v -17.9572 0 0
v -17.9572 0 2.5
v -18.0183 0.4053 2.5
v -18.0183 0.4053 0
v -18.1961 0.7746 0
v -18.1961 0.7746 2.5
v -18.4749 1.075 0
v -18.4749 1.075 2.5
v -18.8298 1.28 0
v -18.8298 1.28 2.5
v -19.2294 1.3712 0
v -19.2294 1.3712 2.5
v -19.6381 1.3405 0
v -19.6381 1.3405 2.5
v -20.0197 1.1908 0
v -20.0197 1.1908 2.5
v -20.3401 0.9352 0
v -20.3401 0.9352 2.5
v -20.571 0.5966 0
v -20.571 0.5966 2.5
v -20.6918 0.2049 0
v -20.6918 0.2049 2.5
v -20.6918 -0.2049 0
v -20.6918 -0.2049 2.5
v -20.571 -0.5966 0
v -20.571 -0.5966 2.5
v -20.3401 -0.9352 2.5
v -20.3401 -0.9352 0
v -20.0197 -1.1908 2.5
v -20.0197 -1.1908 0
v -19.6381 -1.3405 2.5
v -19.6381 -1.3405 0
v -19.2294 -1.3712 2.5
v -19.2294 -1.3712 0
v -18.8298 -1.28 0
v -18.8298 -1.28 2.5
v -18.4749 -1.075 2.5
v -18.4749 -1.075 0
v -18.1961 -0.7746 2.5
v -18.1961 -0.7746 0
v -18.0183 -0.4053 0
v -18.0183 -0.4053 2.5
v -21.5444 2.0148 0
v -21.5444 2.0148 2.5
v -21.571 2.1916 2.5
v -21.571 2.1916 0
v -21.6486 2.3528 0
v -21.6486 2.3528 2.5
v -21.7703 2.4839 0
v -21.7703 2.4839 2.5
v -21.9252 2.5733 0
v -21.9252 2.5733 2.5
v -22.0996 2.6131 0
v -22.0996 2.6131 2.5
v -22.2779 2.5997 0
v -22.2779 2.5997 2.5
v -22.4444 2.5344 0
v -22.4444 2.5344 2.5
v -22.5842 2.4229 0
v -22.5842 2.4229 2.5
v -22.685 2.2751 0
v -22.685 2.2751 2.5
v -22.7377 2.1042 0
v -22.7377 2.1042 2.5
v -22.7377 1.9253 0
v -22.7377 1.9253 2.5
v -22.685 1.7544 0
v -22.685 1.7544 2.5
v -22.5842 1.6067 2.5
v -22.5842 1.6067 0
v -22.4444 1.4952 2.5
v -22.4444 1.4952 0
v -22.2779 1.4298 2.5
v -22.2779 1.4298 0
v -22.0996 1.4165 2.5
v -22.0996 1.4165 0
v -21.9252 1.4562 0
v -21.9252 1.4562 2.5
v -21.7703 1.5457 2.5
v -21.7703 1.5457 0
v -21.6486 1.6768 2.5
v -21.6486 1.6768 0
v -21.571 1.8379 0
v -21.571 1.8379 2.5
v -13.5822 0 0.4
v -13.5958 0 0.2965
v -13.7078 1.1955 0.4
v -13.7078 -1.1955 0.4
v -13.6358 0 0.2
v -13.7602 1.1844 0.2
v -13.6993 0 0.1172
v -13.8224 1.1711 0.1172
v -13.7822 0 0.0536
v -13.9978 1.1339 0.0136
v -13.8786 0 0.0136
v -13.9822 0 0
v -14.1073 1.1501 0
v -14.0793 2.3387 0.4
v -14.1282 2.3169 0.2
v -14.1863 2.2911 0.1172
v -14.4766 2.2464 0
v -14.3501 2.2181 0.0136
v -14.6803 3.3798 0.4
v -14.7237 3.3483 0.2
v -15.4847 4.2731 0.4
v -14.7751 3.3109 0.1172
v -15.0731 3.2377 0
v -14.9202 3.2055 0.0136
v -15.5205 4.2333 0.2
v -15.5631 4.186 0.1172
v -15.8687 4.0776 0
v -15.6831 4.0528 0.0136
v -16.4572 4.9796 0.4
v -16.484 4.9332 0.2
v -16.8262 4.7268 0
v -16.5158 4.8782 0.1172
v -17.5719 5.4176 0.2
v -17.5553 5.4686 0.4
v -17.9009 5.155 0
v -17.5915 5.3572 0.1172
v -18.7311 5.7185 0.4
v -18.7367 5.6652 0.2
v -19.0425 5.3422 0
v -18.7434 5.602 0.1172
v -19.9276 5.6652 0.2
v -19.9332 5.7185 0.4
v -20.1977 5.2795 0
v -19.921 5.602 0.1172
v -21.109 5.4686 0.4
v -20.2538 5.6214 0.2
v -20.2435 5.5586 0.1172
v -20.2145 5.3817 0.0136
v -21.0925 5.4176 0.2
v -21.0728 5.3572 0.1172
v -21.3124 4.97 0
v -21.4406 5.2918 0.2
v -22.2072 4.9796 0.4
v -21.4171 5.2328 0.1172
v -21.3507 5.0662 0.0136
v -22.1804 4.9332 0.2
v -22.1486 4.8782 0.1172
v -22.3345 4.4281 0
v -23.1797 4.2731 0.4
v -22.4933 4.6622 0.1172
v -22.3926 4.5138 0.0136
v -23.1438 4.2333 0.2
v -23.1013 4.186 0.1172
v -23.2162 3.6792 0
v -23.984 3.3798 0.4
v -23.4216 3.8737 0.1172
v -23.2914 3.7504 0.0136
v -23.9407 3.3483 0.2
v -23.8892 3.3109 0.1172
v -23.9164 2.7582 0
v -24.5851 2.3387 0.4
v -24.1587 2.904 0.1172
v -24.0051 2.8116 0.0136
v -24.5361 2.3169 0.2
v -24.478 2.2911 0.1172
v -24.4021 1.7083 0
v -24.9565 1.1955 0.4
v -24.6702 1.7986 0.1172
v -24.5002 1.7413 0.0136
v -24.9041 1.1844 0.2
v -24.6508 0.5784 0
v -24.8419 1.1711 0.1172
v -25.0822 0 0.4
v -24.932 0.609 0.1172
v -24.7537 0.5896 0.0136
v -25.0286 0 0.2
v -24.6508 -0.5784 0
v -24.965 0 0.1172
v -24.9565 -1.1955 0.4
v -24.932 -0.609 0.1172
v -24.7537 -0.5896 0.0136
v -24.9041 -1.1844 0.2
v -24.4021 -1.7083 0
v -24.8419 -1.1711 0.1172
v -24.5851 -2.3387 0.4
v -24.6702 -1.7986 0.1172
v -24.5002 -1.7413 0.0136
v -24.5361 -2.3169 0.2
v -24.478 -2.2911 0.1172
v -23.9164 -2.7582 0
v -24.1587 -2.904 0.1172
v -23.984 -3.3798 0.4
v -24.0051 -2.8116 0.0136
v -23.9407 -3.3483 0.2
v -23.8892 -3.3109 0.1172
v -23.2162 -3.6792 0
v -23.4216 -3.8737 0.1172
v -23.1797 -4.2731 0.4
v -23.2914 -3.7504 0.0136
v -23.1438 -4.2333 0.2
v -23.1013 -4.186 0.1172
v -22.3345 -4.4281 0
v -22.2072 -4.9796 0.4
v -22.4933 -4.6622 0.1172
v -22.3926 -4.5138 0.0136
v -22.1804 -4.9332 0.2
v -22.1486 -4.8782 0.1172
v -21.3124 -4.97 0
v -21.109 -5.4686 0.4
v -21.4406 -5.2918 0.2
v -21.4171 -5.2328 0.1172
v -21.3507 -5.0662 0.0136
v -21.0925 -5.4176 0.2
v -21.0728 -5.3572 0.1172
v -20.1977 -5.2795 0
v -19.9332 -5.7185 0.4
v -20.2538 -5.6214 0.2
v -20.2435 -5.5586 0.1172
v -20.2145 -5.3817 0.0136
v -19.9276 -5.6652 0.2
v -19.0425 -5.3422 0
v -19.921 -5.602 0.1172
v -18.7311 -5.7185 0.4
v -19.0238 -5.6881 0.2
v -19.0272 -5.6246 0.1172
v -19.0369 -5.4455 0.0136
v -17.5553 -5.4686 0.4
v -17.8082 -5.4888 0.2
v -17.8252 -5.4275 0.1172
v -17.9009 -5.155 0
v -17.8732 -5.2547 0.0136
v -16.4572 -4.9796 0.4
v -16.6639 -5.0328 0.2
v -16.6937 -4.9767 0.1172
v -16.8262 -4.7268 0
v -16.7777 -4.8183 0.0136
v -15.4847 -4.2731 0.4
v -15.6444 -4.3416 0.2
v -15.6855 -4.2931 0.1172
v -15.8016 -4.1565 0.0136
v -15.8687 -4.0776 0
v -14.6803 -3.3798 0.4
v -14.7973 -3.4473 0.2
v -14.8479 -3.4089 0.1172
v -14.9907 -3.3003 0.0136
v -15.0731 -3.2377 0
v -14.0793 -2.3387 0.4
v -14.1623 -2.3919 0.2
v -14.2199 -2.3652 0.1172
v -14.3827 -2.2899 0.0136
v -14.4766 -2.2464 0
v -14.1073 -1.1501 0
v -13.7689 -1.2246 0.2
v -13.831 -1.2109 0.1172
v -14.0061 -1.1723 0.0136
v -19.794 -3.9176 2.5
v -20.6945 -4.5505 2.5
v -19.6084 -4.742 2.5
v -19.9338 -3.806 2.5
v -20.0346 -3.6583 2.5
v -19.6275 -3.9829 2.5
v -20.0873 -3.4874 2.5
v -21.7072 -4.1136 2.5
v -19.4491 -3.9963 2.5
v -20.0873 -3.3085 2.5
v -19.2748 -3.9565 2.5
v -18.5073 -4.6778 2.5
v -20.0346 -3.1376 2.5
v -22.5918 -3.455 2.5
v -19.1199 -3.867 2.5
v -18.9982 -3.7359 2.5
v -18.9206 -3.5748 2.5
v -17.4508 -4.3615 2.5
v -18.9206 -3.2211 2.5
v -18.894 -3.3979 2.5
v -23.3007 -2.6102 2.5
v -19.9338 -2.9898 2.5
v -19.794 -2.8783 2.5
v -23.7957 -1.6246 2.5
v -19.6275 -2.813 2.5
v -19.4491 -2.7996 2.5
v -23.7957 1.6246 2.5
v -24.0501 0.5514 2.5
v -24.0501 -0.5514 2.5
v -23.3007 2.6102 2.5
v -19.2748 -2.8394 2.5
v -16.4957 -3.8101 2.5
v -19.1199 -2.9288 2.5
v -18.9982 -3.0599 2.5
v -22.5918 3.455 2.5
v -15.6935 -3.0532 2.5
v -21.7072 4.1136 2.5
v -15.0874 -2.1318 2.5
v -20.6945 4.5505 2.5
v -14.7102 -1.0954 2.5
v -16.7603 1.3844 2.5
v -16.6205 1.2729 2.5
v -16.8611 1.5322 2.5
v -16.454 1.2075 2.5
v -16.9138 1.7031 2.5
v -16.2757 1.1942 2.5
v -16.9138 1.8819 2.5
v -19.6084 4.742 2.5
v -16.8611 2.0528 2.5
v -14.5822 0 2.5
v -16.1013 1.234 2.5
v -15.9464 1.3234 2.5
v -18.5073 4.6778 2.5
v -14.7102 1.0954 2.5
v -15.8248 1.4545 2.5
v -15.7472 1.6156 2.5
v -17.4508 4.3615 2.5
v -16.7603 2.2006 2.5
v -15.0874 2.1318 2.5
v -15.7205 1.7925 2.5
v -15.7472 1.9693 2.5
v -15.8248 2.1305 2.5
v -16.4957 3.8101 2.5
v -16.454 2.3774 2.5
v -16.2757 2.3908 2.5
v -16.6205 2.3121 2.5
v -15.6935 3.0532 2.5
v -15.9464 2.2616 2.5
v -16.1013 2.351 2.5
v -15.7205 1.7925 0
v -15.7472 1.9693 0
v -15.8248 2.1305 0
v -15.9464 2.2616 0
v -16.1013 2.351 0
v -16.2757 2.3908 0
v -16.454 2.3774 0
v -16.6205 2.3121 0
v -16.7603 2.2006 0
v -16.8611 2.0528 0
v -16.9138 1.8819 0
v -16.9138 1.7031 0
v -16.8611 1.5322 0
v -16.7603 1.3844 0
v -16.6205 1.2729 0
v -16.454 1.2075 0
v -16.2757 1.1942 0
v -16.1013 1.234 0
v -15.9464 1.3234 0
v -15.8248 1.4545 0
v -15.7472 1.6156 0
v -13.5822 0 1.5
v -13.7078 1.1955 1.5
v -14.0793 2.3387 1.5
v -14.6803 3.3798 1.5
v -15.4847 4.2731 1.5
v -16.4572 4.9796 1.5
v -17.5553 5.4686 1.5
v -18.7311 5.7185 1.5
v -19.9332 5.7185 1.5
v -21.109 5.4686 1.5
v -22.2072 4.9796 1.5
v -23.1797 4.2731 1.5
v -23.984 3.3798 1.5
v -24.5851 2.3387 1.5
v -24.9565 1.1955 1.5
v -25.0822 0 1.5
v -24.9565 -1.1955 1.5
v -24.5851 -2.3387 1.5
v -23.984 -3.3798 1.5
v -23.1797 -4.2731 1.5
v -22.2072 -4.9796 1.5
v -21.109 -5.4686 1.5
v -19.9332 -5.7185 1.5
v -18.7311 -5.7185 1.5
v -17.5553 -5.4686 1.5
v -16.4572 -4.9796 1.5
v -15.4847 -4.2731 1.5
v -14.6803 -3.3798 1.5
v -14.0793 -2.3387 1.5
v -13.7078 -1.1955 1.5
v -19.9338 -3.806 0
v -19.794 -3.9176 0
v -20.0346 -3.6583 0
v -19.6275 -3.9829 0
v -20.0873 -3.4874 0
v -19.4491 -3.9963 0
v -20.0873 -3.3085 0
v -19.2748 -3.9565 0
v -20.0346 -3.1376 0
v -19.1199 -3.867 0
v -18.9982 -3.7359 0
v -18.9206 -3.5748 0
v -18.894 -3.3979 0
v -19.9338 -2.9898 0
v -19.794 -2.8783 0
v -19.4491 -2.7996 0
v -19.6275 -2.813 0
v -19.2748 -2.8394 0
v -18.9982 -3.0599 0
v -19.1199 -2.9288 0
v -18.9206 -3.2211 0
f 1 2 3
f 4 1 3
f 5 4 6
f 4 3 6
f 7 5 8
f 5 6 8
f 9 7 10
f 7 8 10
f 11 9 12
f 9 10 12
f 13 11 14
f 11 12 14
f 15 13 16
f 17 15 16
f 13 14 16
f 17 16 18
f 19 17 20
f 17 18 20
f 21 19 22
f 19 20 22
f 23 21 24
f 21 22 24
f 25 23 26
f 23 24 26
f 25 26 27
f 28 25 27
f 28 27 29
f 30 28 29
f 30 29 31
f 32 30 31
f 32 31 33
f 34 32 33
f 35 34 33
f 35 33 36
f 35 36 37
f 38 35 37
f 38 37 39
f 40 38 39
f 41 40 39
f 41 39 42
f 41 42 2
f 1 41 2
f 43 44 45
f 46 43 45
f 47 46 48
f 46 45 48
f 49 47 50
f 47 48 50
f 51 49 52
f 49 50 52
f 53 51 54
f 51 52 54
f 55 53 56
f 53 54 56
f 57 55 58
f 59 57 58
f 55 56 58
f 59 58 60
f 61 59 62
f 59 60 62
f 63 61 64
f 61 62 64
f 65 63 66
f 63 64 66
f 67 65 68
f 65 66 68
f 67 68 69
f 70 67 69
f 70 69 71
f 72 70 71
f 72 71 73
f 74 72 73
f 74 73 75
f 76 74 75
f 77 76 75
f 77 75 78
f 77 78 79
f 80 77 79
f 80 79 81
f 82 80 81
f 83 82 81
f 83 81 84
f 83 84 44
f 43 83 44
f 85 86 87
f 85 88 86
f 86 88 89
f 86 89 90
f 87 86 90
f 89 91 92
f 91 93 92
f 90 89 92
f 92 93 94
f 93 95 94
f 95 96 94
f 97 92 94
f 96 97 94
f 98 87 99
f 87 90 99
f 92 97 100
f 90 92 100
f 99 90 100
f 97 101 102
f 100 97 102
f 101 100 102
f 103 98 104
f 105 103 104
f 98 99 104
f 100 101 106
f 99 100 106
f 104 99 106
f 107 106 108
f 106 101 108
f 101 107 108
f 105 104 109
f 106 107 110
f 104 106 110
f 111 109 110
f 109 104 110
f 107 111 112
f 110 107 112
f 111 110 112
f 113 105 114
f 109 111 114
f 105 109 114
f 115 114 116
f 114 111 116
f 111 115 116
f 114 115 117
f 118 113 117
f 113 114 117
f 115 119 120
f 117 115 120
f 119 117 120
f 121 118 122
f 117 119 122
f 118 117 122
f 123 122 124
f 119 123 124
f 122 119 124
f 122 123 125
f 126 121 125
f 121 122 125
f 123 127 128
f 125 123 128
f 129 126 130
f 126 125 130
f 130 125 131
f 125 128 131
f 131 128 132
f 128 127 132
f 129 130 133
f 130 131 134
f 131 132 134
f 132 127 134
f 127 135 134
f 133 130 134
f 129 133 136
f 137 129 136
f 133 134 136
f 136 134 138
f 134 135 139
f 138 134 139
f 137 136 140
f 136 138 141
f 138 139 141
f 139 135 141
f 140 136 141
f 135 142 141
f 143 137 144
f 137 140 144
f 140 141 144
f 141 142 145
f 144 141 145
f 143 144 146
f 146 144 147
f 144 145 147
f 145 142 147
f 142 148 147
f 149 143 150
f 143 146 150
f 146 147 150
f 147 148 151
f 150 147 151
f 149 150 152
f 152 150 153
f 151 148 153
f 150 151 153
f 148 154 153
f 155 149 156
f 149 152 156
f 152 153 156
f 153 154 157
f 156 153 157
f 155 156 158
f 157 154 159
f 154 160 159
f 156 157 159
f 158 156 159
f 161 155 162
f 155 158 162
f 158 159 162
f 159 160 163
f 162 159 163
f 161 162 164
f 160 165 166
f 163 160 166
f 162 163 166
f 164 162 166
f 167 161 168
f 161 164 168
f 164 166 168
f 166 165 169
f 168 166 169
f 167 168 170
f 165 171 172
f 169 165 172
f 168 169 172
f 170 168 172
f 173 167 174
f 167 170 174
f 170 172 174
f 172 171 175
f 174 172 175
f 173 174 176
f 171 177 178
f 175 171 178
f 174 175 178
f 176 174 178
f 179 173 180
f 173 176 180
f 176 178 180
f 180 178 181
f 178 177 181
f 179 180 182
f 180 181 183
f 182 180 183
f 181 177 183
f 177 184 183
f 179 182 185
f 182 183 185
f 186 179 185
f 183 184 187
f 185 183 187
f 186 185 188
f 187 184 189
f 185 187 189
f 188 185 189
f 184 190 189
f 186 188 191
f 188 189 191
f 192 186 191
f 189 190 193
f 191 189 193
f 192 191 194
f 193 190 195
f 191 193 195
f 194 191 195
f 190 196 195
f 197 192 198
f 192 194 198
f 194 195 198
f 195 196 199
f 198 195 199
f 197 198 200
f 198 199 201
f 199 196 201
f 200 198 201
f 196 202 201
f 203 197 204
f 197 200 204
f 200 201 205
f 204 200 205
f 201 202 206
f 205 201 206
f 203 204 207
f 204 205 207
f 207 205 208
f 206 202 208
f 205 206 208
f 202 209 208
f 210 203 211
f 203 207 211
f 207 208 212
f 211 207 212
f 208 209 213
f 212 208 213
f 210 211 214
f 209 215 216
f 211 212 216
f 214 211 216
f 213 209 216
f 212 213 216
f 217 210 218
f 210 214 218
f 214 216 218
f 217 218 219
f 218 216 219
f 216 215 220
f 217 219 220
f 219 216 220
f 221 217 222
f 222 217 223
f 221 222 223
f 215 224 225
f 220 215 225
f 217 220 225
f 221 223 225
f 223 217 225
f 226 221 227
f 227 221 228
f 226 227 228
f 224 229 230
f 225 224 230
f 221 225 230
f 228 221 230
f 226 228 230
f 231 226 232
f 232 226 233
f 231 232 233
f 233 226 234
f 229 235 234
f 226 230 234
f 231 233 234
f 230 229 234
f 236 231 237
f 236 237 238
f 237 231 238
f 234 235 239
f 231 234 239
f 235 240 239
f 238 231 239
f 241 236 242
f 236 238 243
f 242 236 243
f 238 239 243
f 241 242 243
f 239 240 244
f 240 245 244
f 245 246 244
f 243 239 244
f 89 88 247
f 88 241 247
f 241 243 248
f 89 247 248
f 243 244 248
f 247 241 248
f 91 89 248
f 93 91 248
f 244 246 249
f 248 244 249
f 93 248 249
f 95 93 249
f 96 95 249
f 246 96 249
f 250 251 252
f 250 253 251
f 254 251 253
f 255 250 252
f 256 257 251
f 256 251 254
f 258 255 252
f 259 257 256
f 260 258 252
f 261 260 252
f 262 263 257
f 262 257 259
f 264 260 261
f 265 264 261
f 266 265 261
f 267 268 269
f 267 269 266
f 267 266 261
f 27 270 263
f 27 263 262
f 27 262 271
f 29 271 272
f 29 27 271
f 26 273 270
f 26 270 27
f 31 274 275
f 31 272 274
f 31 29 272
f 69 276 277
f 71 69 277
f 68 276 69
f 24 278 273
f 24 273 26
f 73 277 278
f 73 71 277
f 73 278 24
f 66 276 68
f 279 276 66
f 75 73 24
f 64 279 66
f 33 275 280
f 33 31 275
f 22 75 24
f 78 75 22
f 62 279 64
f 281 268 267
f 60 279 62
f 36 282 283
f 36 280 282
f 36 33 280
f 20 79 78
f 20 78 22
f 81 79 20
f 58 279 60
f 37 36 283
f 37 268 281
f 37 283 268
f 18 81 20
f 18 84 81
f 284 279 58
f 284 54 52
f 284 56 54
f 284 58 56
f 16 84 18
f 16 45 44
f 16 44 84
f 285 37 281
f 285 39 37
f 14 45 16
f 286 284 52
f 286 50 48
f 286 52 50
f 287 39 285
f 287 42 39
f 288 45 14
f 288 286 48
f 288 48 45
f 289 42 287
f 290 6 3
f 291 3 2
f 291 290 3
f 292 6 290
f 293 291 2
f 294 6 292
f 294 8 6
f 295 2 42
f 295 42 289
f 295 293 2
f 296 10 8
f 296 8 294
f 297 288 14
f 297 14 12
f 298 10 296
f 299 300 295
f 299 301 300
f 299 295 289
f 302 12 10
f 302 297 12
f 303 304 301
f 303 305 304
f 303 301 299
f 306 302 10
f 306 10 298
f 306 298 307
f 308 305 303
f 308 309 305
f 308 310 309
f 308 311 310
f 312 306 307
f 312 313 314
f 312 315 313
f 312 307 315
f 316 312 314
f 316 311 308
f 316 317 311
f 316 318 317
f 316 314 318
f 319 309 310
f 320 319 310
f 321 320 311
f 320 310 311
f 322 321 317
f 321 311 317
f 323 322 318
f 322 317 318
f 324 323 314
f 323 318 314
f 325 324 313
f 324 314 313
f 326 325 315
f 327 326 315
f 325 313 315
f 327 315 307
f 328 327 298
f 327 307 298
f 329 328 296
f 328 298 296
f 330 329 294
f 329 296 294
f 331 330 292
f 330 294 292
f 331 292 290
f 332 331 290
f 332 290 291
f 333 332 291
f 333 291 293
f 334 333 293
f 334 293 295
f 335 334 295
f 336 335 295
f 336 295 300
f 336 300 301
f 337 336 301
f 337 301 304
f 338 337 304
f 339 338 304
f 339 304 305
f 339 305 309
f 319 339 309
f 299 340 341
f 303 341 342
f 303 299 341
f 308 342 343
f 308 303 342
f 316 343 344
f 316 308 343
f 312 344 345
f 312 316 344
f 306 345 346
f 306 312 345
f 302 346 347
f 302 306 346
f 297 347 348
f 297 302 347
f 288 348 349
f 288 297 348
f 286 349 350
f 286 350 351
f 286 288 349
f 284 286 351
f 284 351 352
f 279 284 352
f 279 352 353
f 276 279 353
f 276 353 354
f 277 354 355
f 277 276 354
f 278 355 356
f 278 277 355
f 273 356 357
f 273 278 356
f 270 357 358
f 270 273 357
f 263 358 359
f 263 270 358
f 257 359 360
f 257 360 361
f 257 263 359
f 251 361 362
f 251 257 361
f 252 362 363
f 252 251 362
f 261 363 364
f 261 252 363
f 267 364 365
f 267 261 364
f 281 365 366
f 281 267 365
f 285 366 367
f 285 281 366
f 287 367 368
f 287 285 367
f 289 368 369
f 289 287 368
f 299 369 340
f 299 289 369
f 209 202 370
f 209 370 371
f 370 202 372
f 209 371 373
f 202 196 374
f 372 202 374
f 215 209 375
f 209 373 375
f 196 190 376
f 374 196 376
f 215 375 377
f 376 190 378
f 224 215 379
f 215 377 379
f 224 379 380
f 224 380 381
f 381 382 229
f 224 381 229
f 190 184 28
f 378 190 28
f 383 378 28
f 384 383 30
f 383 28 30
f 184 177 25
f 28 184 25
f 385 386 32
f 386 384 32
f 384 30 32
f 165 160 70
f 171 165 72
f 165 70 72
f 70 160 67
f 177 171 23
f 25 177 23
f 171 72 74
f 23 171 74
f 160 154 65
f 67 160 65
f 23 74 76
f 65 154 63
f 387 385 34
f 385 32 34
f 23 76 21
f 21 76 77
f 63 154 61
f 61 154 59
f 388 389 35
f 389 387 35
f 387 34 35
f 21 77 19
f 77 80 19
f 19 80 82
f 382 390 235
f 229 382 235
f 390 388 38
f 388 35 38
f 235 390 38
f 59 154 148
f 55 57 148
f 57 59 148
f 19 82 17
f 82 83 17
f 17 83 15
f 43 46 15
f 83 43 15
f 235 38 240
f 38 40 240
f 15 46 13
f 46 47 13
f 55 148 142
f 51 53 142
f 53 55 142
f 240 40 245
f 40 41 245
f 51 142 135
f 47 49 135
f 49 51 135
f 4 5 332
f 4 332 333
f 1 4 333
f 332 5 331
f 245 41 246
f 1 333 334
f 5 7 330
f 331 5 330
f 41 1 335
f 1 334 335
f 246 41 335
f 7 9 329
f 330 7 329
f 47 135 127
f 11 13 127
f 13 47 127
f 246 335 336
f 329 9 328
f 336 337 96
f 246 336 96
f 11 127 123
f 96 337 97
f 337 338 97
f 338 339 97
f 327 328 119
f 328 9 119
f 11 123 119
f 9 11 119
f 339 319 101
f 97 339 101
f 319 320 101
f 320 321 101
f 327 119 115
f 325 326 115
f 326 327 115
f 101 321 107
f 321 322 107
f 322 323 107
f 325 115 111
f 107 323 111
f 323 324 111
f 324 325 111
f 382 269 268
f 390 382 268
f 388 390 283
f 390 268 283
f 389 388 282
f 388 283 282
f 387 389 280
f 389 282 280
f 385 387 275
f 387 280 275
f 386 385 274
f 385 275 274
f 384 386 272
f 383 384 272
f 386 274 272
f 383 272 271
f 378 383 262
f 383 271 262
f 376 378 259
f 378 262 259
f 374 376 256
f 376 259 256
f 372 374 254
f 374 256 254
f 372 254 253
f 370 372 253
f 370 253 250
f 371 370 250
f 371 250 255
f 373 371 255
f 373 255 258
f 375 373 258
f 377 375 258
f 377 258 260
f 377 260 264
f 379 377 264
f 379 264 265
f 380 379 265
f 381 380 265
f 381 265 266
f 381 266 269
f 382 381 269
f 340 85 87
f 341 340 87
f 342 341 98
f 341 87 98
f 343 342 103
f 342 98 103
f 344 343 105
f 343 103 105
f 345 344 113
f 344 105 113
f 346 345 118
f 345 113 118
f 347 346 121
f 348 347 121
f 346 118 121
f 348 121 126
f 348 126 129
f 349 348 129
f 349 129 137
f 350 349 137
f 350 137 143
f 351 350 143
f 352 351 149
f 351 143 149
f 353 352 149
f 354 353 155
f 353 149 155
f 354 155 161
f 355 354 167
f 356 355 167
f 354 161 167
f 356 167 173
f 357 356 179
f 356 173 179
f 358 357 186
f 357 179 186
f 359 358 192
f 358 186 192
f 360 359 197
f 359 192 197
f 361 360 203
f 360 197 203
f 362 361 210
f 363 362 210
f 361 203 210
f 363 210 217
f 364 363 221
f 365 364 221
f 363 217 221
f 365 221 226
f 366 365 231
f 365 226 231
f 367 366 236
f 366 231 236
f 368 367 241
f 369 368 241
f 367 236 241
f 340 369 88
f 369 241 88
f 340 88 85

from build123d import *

# Parameters (mm, degrees)
F0_R     = 5.75
F1_DEPTH = 2.5
F2_R     = 1.375
F3_DEPTH = 25.4
F4_R     = 0.6
F5_DEPTH = 25.4
F6_R     = 0.6
F7_DEPTH = 25.4
F8_R     = 0.6
F9_DEPTH = 25.4
F10_SIZE = 1
F11_R    = 0.4


with BuildPart() as f1:
    # F0 (on Top) → F1 (new body)
    with BuildSketch(Plane.XY):
        with Locations((-19.332174, 0)):
            Circle(F0_R)
    extrude(amount=F1_DEPTH)

    # F2 (on face) → F3 (cut)
    with BuildSketch(Plane.XY.offset(2.5)):
        with Locations((-19.332174, 0)):
            Circle(F2_R)
    extrude(amount=-F3_DEPTH, mode=Mode.SUBTRACT)

    # F4 (on face) → F5 (cut)
    with BuildSketch(Plane.XY.offset(2.5)):
        with Locations((-22.144392, 2.014774)):
            Circle(F4_R)
    extrude(amount=-F5_DEPTH, mode=Mode.SUBTRACT)

    # F6 (on face) → F7 (cut)
    with BuildSketch(Plane.XY.offset(2.5)):
        with Locations((-19.493969, -3.397938)):
            Circle(F6_R)
    extrude(amount=-F7_DEPTH, mode=Mode.SUBTRACT)

    # F8 (on face) → F9 (cut)
    with BuildSketch(Plane.XY.offset(2.5)):
        with Locations((-16.320517, 1.792489)):
            Circle(F8_R)
    extrude(amount=-F9_DEPTH, mode=Mode.SUBTRACT)

    # F10
    f10_edges = [f1.edges().sort_by_distance(p)[0] for p in [
        (-25.082174, 0, 2.5),
    ]]
    chamfer(f10_edges, length=F10_SIZE)

    # F11
    f11_edges = [f1.edges().sort_by_distance(p)[0] for p in [
        (-25.082174, 0, 0),
    ]]
    fillet(f11_edges, radius=F11_R)


solid = f1.part
